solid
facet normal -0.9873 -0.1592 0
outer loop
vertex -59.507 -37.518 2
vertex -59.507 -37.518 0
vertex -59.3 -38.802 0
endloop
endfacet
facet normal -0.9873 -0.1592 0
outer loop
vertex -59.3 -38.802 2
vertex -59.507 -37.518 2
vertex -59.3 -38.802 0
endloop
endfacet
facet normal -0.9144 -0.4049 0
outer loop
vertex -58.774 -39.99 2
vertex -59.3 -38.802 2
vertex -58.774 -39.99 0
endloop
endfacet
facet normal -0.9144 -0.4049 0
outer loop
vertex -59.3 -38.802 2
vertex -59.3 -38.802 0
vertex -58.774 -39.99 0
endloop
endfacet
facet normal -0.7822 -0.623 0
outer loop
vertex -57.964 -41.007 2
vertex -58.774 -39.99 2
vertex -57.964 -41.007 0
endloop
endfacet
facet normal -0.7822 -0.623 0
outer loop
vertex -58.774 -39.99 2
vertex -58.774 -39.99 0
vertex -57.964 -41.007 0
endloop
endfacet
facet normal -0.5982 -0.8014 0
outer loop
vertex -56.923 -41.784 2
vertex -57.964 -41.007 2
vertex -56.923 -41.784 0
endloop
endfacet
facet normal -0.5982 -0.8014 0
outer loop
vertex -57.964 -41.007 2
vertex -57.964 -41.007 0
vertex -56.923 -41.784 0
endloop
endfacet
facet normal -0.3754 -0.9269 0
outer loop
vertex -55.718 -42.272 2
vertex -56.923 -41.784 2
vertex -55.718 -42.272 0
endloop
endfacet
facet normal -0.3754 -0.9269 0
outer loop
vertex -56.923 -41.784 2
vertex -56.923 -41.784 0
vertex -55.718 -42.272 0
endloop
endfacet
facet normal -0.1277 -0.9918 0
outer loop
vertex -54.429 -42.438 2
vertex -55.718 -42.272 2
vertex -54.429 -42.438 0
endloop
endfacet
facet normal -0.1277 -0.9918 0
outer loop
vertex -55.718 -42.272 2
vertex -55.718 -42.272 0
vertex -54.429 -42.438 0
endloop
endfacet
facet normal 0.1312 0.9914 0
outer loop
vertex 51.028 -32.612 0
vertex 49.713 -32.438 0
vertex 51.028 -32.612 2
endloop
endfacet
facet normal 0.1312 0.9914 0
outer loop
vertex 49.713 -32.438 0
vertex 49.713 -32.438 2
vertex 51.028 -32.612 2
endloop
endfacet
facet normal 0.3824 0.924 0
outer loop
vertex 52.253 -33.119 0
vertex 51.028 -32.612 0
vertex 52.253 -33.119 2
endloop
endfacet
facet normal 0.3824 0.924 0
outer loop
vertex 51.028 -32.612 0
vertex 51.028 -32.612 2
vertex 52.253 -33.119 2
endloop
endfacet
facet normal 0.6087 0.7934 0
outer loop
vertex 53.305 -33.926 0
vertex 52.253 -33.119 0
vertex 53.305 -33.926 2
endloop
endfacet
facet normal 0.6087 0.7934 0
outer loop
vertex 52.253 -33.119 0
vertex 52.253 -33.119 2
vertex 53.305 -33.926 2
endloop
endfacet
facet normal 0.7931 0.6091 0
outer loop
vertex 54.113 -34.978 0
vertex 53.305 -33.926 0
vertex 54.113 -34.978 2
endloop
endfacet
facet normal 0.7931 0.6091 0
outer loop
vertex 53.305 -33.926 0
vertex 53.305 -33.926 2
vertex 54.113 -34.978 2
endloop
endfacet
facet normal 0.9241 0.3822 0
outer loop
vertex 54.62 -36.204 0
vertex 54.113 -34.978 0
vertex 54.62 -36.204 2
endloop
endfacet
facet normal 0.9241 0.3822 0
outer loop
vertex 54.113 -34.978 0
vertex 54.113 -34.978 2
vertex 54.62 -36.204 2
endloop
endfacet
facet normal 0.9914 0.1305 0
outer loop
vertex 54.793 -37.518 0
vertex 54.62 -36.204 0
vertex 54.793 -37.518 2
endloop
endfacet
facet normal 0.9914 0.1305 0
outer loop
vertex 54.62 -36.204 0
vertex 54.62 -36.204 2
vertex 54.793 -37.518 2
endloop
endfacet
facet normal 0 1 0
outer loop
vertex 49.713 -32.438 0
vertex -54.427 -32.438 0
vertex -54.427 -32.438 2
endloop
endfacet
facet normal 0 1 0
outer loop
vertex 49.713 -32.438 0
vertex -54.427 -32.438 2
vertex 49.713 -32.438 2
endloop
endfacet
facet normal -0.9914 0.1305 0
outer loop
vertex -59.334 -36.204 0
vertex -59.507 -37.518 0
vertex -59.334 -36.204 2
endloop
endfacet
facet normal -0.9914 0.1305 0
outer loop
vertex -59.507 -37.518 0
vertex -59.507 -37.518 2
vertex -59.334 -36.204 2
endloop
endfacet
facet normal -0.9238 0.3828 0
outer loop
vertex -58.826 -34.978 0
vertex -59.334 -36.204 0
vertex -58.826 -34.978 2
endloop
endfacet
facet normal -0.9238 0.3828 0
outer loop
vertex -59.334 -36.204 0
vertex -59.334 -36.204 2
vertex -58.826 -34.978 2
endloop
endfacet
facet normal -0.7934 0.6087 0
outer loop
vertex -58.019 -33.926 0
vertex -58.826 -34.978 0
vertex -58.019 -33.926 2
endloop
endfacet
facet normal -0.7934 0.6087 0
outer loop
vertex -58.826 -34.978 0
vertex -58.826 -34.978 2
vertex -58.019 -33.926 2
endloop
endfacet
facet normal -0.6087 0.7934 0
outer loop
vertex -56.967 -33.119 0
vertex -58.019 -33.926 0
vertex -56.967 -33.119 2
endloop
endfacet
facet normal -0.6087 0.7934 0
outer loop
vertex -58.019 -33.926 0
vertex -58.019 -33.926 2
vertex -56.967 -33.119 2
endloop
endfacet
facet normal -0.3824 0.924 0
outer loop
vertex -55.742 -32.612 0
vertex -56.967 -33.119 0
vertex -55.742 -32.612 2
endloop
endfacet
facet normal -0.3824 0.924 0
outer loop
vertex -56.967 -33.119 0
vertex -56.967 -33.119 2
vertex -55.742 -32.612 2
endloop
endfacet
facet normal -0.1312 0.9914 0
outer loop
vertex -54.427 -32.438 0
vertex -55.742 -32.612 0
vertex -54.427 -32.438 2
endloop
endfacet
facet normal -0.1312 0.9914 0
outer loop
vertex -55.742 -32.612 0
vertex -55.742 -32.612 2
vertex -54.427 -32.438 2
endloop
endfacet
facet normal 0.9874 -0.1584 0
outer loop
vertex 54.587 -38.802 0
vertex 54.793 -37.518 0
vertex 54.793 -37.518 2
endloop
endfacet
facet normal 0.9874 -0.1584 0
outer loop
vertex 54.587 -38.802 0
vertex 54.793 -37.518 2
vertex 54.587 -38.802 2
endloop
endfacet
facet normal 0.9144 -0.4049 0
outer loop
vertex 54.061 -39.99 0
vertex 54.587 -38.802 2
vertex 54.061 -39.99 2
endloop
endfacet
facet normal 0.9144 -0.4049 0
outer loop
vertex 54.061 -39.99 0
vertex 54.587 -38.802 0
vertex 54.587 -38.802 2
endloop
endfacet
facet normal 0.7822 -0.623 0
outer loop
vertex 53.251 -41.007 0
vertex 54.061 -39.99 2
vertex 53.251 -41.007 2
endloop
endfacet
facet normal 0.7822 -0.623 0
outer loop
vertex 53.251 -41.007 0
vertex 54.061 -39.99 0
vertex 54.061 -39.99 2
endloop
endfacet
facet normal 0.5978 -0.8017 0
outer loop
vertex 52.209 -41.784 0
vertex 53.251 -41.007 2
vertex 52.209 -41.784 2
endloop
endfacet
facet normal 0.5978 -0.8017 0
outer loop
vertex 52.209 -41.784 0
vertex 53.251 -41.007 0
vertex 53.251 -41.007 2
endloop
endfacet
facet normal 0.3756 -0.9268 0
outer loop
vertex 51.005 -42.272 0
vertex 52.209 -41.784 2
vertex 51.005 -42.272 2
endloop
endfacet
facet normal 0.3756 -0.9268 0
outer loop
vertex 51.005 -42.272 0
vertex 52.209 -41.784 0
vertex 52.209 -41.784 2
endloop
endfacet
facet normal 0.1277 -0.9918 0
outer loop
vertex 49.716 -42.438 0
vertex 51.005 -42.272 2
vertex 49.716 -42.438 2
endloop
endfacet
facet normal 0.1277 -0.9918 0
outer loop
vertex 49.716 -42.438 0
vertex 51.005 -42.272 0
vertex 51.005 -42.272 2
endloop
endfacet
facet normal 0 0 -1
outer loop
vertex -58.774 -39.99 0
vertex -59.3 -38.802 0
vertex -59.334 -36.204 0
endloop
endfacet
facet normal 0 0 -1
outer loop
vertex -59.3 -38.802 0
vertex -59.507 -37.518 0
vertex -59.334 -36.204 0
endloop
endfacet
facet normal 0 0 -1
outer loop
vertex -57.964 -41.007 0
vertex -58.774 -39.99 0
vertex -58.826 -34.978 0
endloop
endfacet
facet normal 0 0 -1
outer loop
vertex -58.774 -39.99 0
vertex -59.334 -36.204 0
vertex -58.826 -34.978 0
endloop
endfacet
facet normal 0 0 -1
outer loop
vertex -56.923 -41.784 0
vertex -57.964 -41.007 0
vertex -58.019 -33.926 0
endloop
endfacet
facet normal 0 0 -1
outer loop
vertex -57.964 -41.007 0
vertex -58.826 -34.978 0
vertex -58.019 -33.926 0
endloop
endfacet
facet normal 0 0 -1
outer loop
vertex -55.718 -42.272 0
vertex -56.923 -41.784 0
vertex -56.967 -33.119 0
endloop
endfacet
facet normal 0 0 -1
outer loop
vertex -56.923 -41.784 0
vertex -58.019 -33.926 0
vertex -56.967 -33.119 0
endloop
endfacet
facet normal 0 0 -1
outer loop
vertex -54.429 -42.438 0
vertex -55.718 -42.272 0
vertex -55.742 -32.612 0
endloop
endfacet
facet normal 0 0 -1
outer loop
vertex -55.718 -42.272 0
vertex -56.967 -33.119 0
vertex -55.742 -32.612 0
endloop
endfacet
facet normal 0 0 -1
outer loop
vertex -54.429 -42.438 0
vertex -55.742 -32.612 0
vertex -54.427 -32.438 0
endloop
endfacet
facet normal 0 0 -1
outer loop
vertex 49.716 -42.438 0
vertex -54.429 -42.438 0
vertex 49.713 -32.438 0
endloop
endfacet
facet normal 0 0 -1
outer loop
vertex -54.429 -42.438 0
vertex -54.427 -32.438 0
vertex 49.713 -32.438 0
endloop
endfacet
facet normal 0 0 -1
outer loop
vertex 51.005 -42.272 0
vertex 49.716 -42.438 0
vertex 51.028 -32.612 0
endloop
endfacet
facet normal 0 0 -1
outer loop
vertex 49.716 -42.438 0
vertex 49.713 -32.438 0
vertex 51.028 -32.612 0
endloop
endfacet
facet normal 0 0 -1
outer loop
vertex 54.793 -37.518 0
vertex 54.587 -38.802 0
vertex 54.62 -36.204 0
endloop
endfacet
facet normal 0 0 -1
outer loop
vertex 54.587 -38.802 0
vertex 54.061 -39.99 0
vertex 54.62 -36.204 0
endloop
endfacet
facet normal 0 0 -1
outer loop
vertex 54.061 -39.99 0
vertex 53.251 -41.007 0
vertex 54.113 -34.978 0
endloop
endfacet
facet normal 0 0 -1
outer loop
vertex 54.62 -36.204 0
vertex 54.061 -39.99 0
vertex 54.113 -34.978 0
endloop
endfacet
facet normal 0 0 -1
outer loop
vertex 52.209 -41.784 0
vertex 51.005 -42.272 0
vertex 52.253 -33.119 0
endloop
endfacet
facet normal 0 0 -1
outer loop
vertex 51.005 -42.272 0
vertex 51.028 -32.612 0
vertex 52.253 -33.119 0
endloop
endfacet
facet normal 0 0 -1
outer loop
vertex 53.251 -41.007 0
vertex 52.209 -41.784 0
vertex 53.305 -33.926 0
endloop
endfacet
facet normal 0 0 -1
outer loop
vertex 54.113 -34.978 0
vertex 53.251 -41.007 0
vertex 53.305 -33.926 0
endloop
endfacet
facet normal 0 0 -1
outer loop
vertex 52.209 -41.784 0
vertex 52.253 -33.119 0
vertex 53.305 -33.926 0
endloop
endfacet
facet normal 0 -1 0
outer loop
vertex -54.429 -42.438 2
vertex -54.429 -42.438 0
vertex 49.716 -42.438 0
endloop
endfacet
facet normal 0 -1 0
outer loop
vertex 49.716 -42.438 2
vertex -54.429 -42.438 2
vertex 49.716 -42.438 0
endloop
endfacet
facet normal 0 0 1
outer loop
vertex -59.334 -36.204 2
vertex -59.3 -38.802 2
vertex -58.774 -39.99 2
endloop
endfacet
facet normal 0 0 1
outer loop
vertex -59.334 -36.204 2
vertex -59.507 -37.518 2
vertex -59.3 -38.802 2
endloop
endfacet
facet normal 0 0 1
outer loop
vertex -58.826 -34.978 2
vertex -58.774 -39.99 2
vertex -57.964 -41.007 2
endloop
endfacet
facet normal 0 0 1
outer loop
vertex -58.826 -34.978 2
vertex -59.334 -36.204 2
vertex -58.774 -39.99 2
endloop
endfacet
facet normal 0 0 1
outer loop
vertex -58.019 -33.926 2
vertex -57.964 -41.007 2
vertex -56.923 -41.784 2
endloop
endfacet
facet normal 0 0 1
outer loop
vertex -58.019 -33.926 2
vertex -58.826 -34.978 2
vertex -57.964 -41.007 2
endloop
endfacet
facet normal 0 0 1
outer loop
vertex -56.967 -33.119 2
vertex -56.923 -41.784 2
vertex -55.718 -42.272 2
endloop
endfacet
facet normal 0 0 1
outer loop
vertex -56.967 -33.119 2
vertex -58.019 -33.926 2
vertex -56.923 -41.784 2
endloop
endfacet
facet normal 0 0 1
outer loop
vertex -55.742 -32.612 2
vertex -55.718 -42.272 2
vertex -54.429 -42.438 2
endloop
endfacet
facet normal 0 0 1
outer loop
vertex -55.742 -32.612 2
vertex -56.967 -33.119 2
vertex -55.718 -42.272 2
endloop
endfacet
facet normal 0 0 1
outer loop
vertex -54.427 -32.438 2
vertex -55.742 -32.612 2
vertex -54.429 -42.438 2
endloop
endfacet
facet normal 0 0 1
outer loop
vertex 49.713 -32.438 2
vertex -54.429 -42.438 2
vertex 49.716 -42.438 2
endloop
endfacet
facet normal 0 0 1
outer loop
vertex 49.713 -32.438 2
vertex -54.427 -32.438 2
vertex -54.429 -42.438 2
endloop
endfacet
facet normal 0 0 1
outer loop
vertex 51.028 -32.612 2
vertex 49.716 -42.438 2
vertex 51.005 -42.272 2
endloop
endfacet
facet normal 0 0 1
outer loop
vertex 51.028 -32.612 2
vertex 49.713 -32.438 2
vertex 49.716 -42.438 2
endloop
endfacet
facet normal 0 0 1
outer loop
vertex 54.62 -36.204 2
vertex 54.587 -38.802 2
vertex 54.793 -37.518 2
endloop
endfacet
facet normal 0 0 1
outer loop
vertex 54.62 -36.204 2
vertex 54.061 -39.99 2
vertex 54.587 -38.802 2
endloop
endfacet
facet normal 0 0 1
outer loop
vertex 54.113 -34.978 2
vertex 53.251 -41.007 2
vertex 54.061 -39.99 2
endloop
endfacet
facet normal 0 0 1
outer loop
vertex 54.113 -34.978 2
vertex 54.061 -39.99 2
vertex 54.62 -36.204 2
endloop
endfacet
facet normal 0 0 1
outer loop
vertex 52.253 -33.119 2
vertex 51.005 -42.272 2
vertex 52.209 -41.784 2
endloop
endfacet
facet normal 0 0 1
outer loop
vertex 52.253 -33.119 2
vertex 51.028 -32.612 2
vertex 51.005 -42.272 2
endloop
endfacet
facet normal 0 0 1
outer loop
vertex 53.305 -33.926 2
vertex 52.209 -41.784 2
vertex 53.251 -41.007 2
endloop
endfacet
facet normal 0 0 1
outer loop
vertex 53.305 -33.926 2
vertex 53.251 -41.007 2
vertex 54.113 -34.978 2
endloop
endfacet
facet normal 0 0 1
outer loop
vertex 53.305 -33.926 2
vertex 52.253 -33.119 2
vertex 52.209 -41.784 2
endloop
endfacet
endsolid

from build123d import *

# Parameters (mm, degrees)
F0_W        = 114.3
F0_H        = 10
F1_DEPTH    = 2
F2_R        = 5.08
F3_R        = 5.08
F4_T1_DEPTH = 27.3873984488
F5_T1_DEPTH = 27.3873984488


# Not quite as in the source:
# - a fillet or chamfer that OpenCascade refuses, or shapes differently, is made with other operations: its cross-section is extruded or revolved along the edge and cut away or added


with BuildPart() as f1:
    # F0 (on Top) → F1 (new body)
    with BuildSketch(Plane.XY):
        with Locations((-2.3567027405, -37.438484022)):
            Rectangle(F0_W, F0_H)
    extrude(amount=F1_DEPTH)

    # F2
    f2_edges = [f1.edges().sort_by_distance(p)[0] for p in [
        (-59.506703, -32.438484, 1),
    ]]
    fillet(f2_edges, radius=F2_R)

    # F3
    f3_edges = [f1.edges().sort_by_distance(p)[0] for p in [
        (54.793297, -32.438484, 1),
    ]]
    fillet(f3_edges, radius=F3_R)

    # F4: fillet of radius 5.08 on 1 edges, made by hand

    # F4_s2 → F4_t1 (cut)
    with BuildSketch(Plane.XY.offset(-12.6936992244)):
        with BuildLine():
            ThreePointArc((-59.5067027405, -37.518484022), (-57.9643043793, -41.0067164708), (-54.4292230507, -42.438484022))
            Line((-54.4292230507, -42.438484022), (-59.5067027405, -42.438484022))
            Line((-59.5067027405, -42.438484022), (-59.5067027405, -37.518484022))
        make_face()
    extrude(amount=F4_T1_DEPTH, mode=Mode.SUBTRACT)

    # F5: fillet of radius 5.08 on 1 edges, made by hand

    # F5_s2 → F5_t1 (cut)
    with BuildSketch(Plane.XY.offset(-12.6936992244)):
        with BuildLine():
            ThreePointArc((54.7932972595, -37.518484022), (53.2508988984, -41.0067164708), (49.7158175697, -42.438484022))
            Line((49.7158175697, -42.438484022), (54.7932972595, -42.438484022))
            Line((54.7932972595, -42.438484022), (54.7932972595, -37.518484022))
        make_face()
    extrude(amount=F5_T1_DEPTH, mode=Mode.SUBTRACT)


solid = f1.part
